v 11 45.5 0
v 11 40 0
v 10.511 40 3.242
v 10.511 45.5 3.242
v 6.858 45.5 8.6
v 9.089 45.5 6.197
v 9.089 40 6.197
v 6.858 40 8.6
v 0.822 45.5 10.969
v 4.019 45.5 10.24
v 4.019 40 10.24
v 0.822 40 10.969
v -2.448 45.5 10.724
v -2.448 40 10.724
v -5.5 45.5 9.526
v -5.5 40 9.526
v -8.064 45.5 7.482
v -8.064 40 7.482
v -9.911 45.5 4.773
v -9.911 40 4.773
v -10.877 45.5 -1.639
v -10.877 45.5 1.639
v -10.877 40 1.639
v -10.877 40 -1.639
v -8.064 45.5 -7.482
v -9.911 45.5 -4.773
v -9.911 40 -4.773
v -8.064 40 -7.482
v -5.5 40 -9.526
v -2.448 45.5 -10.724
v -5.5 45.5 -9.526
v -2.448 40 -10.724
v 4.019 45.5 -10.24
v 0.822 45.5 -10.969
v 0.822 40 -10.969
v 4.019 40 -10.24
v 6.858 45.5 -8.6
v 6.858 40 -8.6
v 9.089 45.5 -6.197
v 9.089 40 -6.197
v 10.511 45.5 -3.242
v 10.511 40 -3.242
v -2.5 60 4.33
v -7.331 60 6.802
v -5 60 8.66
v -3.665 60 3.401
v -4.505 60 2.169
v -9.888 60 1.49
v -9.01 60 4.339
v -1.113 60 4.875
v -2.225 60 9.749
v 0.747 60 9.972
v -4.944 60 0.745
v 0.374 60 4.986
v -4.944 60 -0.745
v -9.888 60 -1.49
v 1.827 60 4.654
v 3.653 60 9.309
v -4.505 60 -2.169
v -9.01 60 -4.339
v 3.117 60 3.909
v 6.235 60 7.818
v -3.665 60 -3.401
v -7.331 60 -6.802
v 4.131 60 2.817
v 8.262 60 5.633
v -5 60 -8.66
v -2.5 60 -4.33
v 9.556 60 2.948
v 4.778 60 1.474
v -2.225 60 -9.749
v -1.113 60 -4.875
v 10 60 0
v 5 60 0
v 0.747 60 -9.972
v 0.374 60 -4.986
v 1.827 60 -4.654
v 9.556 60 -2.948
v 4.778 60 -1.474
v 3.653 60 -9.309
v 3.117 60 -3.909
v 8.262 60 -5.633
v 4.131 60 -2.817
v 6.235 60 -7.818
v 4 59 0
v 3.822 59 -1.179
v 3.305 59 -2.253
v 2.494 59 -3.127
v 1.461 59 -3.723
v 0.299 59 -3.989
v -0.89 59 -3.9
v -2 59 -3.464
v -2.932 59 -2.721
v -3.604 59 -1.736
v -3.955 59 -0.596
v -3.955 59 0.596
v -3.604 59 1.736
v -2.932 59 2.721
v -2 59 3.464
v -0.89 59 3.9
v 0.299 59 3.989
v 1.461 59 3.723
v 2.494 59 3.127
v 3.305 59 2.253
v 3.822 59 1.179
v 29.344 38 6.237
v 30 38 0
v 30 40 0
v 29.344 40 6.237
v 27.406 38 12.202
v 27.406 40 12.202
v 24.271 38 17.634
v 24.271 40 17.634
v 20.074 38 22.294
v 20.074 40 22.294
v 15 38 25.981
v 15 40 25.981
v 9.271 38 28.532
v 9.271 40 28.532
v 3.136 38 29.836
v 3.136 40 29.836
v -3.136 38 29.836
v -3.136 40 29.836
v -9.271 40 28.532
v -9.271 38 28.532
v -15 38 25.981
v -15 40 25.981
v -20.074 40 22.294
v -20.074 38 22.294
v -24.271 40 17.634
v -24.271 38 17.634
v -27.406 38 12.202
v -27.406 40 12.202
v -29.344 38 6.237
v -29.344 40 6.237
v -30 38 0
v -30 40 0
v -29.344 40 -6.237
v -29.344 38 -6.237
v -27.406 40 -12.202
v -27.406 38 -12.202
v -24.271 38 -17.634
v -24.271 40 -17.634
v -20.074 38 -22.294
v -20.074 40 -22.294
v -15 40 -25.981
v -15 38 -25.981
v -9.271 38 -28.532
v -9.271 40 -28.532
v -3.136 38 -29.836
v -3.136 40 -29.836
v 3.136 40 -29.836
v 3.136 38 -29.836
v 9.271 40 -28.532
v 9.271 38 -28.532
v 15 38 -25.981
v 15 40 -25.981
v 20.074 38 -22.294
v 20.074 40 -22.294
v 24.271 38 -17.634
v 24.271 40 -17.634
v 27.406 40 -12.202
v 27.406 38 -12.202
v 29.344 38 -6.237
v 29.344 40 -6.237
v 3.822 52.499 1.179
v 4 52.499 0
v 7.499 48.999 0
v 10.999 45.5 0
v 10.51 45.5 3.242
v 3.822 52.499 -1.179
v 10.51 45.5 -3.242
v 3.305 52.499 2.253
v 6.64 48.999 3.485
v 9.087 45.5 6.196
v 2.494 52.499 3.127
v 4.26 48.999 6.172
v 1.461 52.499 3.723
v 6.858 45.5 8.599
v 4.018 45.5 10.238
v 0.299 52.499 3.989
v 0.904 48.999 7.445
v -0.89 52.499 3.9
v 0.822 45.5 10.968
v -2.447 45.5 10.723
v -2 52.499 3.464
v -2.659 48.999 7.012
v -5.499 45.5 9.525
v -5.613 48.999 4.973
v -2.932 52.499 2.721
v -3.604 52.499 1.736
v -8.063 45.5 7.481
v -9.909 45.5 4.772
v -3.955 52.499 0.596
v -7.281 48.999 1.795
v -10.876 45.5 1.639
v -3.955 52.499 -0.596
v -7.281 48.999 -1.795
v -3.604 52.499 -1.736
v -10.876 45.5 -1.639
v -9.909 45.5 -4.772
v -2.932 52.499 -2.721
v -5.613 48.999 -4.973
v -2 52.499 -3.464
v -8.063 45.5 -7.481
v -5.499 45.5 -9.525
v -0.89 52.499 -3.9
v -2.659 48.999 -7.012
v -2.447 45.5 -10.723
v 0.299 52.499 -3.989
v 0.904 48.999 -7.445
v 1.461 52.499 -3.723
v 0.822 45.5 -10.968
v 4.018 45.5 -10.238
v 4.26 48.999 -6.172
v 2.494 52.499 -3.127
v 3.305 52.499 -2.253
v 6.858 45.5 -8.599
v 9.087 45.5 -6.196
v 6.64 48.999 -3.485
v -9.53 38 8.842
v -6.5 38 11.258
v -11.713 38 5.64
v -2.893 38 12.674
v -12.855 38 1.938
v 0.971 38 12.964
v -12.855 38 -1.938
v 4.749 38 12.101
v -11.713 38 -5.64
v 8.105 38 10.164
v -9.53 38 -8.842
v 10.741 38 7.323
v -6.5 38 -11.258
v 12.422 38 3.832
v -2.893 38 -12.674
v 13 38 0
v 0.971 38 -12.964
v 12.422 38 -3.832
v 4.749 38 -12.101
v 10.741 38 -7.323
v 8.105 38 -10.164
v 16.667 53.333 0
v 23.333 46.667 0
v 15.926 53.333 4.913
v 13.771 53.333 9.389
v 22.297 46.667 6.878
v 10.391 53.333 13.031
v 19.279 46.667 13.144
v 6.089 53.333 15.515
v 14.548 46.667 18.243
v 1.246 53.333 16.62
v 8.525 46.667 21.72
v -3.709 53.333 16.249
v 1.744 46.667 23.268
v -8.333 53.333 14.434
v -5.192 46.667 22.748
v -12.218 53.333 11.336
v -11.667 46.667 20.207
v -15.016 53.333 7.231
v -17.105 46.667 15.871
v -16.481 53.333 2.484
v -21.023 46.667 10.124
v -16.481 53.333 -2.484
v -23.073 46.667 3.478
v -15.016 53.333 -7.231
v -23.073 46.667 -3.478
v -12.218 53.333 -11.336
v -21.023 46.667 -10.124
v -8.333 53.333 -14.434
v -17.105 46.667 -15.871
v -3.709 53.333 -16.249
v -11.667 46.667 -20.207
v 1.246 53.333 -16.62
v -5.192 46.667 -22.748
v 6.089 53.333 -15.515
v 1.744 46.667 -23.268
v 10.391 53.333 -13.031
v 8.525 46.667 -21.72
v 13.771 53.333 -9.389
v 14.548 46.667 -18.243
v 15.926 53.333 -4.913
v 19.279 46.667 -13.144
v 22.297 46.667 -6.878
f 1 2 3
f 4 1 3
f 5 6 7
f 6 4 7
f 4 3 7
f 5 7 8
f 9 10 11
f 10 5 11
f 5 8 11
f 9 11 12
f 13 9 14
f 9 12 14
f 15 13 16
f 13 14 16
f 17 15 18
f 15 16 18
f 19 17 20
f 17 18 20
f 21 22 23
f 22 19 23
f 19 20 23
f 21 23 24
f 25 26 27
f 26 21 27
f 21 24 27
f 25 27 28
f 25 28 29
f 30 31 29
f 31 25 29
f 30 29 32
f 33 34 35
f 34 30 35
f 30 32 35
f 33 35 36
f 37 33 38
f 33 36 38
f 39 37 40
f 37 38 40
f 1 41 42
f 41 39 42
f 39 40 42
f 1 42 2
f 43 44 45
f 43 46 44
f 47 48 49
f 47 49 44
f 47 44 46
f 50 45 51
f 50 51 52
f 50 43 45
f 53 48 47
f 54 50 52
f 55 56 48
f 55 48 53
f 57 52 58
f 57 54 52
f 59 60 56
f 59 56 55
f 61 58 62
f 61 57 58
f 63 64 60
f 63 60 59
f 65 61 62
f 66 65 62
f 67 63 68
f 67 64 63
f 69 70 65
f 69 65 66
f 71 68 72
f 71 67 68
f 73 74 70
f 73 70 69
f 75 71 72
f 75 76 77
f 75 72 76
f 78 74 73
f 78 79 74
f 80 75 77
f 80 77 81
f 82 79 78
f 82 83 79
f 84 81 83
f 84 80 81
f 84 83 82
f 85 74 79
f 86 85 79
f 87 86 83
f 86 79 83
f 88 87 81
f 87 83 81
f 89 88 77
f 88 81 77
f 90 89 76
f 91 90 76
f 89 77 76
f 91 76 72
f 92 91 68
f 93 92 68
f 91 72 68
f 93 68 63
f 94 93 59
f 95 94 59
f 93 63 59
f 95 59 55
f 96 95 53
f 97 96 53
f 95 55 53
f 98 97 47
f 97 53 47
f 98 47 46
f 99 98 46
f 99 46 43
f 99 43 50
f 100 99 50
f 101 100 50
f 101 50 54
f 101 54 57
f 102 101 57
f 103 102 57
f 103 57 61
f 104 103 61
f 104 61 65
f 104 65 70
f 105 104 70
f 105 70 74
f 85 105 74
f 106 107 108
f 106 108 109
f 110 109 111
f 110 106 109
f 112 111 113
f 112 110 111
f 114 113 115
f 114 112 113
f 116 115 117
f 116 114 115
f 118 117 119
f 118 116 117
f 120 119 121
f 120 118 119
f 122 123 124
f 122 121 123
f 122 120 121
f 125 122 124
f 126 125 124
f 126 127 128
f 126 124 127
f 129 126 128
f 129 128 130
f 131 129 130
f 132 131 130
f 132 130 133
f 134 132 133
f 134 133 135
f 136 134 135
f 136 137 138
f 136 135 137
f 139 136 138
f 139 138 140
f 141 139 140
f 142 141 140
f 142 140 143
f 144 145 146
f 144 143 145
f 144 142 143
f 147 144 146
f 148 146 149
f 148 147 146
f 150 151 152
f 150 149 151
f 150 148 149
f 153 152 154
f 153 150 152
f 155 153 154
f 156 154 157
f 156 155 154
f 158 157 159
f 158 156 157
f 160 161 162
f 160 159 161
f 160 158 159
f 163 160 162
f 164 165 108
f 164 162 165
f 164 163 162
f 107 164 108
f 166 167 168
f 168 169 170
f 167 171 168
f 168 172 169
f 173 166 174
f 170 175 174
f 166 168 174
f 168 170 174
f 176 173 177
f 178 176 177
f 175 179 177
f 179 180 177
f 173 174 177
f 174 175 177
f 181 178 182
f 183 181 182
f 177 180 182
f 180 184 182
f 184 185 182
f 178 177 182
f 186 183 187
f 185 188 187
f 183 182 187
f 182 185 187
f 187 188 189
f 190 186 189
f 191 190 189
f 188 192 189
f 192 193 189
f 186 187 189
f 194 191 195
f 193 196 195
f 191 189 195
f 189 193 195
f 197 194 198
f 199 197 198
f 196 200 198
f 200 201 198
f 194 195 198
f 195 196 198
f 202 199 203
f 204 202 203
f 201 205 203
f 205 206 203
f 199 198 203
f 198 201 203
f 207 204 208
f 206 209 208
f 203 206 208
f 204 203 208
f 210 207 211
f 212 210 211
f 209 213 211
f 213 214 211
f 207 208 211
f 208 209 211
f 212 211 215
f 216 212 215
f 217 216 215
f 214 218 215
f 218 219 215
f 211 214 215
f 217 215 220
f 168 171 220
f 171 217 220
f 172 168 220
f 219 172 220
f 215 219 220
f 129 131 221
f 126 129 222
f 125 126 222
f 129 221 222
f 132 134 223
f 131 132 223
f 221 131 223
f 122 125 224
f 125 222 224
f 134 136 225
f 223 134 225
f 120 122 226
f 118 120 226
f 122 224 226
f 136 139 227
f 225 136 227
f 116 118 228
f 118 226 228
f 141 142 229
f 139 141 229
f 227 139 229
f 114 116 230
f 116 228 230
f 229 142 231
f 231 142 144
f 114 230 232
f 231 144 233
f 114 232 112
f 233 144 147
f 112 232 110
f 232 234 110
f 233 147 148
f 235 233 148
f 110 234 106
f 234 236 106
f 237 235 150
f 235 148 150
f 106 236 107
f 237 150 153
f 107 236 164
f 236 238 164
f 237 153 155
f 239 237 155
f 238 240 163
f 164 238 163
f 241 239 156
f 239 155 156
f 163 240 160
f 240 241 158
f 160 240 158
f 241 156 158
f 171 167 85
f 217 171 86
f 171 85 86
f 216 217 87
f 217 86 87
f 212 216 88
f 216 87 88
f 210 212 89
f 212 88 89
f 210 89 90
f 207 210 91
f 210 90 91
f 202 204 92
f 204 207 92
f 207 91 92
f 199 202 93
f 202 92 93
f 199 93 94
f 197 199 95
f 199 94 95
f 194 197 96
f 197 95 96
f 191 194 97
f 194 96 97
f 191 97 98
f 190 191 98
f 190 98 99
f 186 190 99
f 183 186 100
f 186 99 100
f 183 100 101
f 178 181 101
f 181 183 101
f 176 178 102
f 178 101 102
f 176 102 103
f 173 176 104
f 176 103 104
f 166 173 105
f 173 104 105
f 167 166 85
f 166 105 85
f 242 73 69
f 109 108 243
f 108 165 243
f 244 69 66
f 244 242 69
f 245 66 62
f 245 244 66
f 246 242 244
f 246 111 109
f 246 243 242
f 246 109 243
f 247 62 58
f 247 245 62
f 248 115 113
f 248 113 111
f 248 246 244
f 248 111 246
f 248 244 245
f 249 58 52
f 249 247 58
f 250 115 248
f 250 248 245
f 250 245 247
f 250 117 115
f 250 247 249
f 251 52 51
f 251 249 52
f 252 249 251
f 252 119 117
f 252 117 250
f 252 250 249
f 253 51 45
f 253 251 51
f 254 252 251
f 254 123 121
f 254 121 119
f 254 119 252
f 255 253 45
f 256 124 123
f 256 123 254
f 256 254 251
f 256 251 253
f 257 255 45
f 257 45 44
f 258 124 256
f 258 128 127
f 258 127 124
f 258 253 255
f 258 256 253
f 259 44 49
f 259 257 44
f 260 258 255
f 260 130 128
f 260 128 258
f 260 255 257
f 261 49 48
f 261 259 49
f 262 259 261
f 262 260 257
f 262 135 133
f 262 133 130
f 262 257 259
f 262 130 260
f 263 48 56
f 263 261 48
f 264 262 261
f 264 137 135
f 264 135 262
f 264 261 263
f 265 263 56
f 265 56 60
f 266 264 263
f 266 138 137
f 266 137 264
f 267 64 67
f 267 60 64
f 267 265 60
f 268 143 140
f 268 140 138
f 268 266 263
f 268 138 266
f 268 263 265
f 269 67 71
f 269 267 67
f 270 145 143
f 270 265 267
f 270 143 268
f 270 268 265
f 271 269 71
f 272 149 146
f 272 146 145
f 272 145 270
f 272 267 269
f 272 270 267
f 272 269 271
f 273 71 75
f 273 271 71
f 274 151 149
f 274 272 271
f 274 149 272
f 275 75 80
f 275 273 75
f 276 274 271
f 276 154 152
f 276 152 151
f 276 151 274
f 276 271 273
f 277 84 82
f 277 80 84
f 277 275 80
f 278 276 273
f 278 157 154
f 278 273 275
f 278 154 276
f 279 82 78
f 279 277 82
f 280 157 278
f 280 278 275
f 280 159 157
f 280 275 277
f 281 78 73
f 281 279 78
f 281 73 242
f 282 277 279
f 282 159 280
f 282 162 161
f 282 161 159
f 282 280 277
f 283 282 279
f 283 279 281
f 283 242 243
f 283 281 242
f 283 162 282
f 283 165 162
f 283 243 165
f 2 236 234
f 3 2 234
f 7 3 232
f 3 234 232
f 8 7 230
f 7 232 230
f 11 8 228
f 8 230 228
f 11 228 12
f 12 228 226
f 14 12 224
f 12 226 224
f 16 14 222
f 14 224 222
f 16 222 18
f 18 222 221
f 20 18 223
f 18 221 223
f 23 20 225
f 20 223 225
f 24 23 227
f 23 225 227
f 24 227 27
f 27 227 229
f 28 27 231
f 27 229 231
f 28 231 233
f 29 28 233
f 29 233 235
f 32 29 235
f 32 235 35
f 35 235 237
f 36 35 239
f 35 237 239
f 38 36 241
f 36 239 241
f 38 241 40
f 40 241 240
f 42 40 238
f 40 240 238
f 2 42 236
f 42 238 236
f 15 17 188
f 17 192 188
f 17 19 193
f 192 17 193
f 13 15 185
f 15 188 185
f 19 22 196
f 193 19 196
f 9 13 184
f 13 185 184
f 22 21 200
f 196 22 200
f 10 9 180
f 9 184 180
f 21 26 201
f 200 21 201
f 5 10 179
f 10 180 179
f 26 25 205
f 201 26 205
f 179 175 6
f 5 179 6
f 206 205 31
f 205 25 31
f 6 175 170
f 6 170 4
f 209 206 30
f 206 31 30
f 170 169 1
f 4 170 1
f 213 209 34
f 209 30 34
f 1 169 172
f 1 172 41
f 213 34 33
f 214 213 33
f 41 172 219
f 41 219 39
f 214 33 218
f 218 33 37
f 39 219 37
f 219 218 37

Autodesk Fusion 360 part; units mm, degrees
sketch "Sketch1" plane through (0, 0, 0) normal (0, 1, 0) x (1, 0, 0)
  circle A0 centre (0, 0) radius 30
  circle A1 centre (0, 0) radius 4
  dimension "d1" = 60
  dimension "d3" = 8
extrude "Extrude1" add sketch "Sketch1" along normal blind 60
chamfer "Chamfer1" distance 20 angle 45 1 edges at (-27.9698, 60, 10.8485) measured on face at (21.2216, 60, 1.4904)
sketch "Sketch2" plane through (0, 0, 0) normal (0, 1, 0) x (1, 0, 0)
  circle A0 centre (0, 0) radius 11
  dimension "d8" = 22
extrude "Extrude2" cut sketch "Sketch2" along normal blind 8
extrude "Extrude3" cut 1 faces at (23.514, 0, 2.0369) along direction (0, 1, 0) blind 38
extrude "Extrude4" cut 1 faces at (8.6257, 8, 0.5465) along direction (0, 1, 0) blind 38
extrude "Extrude5" add 1 faces at (8.6257, 46, 0.5465) along direction (0, -1, 0) blind 0.5
chamfer "Chamfer2" distance 7 angle 45 1 edges at (-3.7293, 45.5, 1.4465) measured on face at (8.6257, 45.5, 0.5465)
chamfer "Chamfer3" distance 2 angle 45 1 edges at (-10.2556, 38, -3.9778) measured on face at (10.9453, 43, 1.0952)
chamfer "Chamfer4" distance 1 angle 45 1 edges at (-3.7293, 60, -1.4465) measured on face at (7.9479, 60, 0.6955)
